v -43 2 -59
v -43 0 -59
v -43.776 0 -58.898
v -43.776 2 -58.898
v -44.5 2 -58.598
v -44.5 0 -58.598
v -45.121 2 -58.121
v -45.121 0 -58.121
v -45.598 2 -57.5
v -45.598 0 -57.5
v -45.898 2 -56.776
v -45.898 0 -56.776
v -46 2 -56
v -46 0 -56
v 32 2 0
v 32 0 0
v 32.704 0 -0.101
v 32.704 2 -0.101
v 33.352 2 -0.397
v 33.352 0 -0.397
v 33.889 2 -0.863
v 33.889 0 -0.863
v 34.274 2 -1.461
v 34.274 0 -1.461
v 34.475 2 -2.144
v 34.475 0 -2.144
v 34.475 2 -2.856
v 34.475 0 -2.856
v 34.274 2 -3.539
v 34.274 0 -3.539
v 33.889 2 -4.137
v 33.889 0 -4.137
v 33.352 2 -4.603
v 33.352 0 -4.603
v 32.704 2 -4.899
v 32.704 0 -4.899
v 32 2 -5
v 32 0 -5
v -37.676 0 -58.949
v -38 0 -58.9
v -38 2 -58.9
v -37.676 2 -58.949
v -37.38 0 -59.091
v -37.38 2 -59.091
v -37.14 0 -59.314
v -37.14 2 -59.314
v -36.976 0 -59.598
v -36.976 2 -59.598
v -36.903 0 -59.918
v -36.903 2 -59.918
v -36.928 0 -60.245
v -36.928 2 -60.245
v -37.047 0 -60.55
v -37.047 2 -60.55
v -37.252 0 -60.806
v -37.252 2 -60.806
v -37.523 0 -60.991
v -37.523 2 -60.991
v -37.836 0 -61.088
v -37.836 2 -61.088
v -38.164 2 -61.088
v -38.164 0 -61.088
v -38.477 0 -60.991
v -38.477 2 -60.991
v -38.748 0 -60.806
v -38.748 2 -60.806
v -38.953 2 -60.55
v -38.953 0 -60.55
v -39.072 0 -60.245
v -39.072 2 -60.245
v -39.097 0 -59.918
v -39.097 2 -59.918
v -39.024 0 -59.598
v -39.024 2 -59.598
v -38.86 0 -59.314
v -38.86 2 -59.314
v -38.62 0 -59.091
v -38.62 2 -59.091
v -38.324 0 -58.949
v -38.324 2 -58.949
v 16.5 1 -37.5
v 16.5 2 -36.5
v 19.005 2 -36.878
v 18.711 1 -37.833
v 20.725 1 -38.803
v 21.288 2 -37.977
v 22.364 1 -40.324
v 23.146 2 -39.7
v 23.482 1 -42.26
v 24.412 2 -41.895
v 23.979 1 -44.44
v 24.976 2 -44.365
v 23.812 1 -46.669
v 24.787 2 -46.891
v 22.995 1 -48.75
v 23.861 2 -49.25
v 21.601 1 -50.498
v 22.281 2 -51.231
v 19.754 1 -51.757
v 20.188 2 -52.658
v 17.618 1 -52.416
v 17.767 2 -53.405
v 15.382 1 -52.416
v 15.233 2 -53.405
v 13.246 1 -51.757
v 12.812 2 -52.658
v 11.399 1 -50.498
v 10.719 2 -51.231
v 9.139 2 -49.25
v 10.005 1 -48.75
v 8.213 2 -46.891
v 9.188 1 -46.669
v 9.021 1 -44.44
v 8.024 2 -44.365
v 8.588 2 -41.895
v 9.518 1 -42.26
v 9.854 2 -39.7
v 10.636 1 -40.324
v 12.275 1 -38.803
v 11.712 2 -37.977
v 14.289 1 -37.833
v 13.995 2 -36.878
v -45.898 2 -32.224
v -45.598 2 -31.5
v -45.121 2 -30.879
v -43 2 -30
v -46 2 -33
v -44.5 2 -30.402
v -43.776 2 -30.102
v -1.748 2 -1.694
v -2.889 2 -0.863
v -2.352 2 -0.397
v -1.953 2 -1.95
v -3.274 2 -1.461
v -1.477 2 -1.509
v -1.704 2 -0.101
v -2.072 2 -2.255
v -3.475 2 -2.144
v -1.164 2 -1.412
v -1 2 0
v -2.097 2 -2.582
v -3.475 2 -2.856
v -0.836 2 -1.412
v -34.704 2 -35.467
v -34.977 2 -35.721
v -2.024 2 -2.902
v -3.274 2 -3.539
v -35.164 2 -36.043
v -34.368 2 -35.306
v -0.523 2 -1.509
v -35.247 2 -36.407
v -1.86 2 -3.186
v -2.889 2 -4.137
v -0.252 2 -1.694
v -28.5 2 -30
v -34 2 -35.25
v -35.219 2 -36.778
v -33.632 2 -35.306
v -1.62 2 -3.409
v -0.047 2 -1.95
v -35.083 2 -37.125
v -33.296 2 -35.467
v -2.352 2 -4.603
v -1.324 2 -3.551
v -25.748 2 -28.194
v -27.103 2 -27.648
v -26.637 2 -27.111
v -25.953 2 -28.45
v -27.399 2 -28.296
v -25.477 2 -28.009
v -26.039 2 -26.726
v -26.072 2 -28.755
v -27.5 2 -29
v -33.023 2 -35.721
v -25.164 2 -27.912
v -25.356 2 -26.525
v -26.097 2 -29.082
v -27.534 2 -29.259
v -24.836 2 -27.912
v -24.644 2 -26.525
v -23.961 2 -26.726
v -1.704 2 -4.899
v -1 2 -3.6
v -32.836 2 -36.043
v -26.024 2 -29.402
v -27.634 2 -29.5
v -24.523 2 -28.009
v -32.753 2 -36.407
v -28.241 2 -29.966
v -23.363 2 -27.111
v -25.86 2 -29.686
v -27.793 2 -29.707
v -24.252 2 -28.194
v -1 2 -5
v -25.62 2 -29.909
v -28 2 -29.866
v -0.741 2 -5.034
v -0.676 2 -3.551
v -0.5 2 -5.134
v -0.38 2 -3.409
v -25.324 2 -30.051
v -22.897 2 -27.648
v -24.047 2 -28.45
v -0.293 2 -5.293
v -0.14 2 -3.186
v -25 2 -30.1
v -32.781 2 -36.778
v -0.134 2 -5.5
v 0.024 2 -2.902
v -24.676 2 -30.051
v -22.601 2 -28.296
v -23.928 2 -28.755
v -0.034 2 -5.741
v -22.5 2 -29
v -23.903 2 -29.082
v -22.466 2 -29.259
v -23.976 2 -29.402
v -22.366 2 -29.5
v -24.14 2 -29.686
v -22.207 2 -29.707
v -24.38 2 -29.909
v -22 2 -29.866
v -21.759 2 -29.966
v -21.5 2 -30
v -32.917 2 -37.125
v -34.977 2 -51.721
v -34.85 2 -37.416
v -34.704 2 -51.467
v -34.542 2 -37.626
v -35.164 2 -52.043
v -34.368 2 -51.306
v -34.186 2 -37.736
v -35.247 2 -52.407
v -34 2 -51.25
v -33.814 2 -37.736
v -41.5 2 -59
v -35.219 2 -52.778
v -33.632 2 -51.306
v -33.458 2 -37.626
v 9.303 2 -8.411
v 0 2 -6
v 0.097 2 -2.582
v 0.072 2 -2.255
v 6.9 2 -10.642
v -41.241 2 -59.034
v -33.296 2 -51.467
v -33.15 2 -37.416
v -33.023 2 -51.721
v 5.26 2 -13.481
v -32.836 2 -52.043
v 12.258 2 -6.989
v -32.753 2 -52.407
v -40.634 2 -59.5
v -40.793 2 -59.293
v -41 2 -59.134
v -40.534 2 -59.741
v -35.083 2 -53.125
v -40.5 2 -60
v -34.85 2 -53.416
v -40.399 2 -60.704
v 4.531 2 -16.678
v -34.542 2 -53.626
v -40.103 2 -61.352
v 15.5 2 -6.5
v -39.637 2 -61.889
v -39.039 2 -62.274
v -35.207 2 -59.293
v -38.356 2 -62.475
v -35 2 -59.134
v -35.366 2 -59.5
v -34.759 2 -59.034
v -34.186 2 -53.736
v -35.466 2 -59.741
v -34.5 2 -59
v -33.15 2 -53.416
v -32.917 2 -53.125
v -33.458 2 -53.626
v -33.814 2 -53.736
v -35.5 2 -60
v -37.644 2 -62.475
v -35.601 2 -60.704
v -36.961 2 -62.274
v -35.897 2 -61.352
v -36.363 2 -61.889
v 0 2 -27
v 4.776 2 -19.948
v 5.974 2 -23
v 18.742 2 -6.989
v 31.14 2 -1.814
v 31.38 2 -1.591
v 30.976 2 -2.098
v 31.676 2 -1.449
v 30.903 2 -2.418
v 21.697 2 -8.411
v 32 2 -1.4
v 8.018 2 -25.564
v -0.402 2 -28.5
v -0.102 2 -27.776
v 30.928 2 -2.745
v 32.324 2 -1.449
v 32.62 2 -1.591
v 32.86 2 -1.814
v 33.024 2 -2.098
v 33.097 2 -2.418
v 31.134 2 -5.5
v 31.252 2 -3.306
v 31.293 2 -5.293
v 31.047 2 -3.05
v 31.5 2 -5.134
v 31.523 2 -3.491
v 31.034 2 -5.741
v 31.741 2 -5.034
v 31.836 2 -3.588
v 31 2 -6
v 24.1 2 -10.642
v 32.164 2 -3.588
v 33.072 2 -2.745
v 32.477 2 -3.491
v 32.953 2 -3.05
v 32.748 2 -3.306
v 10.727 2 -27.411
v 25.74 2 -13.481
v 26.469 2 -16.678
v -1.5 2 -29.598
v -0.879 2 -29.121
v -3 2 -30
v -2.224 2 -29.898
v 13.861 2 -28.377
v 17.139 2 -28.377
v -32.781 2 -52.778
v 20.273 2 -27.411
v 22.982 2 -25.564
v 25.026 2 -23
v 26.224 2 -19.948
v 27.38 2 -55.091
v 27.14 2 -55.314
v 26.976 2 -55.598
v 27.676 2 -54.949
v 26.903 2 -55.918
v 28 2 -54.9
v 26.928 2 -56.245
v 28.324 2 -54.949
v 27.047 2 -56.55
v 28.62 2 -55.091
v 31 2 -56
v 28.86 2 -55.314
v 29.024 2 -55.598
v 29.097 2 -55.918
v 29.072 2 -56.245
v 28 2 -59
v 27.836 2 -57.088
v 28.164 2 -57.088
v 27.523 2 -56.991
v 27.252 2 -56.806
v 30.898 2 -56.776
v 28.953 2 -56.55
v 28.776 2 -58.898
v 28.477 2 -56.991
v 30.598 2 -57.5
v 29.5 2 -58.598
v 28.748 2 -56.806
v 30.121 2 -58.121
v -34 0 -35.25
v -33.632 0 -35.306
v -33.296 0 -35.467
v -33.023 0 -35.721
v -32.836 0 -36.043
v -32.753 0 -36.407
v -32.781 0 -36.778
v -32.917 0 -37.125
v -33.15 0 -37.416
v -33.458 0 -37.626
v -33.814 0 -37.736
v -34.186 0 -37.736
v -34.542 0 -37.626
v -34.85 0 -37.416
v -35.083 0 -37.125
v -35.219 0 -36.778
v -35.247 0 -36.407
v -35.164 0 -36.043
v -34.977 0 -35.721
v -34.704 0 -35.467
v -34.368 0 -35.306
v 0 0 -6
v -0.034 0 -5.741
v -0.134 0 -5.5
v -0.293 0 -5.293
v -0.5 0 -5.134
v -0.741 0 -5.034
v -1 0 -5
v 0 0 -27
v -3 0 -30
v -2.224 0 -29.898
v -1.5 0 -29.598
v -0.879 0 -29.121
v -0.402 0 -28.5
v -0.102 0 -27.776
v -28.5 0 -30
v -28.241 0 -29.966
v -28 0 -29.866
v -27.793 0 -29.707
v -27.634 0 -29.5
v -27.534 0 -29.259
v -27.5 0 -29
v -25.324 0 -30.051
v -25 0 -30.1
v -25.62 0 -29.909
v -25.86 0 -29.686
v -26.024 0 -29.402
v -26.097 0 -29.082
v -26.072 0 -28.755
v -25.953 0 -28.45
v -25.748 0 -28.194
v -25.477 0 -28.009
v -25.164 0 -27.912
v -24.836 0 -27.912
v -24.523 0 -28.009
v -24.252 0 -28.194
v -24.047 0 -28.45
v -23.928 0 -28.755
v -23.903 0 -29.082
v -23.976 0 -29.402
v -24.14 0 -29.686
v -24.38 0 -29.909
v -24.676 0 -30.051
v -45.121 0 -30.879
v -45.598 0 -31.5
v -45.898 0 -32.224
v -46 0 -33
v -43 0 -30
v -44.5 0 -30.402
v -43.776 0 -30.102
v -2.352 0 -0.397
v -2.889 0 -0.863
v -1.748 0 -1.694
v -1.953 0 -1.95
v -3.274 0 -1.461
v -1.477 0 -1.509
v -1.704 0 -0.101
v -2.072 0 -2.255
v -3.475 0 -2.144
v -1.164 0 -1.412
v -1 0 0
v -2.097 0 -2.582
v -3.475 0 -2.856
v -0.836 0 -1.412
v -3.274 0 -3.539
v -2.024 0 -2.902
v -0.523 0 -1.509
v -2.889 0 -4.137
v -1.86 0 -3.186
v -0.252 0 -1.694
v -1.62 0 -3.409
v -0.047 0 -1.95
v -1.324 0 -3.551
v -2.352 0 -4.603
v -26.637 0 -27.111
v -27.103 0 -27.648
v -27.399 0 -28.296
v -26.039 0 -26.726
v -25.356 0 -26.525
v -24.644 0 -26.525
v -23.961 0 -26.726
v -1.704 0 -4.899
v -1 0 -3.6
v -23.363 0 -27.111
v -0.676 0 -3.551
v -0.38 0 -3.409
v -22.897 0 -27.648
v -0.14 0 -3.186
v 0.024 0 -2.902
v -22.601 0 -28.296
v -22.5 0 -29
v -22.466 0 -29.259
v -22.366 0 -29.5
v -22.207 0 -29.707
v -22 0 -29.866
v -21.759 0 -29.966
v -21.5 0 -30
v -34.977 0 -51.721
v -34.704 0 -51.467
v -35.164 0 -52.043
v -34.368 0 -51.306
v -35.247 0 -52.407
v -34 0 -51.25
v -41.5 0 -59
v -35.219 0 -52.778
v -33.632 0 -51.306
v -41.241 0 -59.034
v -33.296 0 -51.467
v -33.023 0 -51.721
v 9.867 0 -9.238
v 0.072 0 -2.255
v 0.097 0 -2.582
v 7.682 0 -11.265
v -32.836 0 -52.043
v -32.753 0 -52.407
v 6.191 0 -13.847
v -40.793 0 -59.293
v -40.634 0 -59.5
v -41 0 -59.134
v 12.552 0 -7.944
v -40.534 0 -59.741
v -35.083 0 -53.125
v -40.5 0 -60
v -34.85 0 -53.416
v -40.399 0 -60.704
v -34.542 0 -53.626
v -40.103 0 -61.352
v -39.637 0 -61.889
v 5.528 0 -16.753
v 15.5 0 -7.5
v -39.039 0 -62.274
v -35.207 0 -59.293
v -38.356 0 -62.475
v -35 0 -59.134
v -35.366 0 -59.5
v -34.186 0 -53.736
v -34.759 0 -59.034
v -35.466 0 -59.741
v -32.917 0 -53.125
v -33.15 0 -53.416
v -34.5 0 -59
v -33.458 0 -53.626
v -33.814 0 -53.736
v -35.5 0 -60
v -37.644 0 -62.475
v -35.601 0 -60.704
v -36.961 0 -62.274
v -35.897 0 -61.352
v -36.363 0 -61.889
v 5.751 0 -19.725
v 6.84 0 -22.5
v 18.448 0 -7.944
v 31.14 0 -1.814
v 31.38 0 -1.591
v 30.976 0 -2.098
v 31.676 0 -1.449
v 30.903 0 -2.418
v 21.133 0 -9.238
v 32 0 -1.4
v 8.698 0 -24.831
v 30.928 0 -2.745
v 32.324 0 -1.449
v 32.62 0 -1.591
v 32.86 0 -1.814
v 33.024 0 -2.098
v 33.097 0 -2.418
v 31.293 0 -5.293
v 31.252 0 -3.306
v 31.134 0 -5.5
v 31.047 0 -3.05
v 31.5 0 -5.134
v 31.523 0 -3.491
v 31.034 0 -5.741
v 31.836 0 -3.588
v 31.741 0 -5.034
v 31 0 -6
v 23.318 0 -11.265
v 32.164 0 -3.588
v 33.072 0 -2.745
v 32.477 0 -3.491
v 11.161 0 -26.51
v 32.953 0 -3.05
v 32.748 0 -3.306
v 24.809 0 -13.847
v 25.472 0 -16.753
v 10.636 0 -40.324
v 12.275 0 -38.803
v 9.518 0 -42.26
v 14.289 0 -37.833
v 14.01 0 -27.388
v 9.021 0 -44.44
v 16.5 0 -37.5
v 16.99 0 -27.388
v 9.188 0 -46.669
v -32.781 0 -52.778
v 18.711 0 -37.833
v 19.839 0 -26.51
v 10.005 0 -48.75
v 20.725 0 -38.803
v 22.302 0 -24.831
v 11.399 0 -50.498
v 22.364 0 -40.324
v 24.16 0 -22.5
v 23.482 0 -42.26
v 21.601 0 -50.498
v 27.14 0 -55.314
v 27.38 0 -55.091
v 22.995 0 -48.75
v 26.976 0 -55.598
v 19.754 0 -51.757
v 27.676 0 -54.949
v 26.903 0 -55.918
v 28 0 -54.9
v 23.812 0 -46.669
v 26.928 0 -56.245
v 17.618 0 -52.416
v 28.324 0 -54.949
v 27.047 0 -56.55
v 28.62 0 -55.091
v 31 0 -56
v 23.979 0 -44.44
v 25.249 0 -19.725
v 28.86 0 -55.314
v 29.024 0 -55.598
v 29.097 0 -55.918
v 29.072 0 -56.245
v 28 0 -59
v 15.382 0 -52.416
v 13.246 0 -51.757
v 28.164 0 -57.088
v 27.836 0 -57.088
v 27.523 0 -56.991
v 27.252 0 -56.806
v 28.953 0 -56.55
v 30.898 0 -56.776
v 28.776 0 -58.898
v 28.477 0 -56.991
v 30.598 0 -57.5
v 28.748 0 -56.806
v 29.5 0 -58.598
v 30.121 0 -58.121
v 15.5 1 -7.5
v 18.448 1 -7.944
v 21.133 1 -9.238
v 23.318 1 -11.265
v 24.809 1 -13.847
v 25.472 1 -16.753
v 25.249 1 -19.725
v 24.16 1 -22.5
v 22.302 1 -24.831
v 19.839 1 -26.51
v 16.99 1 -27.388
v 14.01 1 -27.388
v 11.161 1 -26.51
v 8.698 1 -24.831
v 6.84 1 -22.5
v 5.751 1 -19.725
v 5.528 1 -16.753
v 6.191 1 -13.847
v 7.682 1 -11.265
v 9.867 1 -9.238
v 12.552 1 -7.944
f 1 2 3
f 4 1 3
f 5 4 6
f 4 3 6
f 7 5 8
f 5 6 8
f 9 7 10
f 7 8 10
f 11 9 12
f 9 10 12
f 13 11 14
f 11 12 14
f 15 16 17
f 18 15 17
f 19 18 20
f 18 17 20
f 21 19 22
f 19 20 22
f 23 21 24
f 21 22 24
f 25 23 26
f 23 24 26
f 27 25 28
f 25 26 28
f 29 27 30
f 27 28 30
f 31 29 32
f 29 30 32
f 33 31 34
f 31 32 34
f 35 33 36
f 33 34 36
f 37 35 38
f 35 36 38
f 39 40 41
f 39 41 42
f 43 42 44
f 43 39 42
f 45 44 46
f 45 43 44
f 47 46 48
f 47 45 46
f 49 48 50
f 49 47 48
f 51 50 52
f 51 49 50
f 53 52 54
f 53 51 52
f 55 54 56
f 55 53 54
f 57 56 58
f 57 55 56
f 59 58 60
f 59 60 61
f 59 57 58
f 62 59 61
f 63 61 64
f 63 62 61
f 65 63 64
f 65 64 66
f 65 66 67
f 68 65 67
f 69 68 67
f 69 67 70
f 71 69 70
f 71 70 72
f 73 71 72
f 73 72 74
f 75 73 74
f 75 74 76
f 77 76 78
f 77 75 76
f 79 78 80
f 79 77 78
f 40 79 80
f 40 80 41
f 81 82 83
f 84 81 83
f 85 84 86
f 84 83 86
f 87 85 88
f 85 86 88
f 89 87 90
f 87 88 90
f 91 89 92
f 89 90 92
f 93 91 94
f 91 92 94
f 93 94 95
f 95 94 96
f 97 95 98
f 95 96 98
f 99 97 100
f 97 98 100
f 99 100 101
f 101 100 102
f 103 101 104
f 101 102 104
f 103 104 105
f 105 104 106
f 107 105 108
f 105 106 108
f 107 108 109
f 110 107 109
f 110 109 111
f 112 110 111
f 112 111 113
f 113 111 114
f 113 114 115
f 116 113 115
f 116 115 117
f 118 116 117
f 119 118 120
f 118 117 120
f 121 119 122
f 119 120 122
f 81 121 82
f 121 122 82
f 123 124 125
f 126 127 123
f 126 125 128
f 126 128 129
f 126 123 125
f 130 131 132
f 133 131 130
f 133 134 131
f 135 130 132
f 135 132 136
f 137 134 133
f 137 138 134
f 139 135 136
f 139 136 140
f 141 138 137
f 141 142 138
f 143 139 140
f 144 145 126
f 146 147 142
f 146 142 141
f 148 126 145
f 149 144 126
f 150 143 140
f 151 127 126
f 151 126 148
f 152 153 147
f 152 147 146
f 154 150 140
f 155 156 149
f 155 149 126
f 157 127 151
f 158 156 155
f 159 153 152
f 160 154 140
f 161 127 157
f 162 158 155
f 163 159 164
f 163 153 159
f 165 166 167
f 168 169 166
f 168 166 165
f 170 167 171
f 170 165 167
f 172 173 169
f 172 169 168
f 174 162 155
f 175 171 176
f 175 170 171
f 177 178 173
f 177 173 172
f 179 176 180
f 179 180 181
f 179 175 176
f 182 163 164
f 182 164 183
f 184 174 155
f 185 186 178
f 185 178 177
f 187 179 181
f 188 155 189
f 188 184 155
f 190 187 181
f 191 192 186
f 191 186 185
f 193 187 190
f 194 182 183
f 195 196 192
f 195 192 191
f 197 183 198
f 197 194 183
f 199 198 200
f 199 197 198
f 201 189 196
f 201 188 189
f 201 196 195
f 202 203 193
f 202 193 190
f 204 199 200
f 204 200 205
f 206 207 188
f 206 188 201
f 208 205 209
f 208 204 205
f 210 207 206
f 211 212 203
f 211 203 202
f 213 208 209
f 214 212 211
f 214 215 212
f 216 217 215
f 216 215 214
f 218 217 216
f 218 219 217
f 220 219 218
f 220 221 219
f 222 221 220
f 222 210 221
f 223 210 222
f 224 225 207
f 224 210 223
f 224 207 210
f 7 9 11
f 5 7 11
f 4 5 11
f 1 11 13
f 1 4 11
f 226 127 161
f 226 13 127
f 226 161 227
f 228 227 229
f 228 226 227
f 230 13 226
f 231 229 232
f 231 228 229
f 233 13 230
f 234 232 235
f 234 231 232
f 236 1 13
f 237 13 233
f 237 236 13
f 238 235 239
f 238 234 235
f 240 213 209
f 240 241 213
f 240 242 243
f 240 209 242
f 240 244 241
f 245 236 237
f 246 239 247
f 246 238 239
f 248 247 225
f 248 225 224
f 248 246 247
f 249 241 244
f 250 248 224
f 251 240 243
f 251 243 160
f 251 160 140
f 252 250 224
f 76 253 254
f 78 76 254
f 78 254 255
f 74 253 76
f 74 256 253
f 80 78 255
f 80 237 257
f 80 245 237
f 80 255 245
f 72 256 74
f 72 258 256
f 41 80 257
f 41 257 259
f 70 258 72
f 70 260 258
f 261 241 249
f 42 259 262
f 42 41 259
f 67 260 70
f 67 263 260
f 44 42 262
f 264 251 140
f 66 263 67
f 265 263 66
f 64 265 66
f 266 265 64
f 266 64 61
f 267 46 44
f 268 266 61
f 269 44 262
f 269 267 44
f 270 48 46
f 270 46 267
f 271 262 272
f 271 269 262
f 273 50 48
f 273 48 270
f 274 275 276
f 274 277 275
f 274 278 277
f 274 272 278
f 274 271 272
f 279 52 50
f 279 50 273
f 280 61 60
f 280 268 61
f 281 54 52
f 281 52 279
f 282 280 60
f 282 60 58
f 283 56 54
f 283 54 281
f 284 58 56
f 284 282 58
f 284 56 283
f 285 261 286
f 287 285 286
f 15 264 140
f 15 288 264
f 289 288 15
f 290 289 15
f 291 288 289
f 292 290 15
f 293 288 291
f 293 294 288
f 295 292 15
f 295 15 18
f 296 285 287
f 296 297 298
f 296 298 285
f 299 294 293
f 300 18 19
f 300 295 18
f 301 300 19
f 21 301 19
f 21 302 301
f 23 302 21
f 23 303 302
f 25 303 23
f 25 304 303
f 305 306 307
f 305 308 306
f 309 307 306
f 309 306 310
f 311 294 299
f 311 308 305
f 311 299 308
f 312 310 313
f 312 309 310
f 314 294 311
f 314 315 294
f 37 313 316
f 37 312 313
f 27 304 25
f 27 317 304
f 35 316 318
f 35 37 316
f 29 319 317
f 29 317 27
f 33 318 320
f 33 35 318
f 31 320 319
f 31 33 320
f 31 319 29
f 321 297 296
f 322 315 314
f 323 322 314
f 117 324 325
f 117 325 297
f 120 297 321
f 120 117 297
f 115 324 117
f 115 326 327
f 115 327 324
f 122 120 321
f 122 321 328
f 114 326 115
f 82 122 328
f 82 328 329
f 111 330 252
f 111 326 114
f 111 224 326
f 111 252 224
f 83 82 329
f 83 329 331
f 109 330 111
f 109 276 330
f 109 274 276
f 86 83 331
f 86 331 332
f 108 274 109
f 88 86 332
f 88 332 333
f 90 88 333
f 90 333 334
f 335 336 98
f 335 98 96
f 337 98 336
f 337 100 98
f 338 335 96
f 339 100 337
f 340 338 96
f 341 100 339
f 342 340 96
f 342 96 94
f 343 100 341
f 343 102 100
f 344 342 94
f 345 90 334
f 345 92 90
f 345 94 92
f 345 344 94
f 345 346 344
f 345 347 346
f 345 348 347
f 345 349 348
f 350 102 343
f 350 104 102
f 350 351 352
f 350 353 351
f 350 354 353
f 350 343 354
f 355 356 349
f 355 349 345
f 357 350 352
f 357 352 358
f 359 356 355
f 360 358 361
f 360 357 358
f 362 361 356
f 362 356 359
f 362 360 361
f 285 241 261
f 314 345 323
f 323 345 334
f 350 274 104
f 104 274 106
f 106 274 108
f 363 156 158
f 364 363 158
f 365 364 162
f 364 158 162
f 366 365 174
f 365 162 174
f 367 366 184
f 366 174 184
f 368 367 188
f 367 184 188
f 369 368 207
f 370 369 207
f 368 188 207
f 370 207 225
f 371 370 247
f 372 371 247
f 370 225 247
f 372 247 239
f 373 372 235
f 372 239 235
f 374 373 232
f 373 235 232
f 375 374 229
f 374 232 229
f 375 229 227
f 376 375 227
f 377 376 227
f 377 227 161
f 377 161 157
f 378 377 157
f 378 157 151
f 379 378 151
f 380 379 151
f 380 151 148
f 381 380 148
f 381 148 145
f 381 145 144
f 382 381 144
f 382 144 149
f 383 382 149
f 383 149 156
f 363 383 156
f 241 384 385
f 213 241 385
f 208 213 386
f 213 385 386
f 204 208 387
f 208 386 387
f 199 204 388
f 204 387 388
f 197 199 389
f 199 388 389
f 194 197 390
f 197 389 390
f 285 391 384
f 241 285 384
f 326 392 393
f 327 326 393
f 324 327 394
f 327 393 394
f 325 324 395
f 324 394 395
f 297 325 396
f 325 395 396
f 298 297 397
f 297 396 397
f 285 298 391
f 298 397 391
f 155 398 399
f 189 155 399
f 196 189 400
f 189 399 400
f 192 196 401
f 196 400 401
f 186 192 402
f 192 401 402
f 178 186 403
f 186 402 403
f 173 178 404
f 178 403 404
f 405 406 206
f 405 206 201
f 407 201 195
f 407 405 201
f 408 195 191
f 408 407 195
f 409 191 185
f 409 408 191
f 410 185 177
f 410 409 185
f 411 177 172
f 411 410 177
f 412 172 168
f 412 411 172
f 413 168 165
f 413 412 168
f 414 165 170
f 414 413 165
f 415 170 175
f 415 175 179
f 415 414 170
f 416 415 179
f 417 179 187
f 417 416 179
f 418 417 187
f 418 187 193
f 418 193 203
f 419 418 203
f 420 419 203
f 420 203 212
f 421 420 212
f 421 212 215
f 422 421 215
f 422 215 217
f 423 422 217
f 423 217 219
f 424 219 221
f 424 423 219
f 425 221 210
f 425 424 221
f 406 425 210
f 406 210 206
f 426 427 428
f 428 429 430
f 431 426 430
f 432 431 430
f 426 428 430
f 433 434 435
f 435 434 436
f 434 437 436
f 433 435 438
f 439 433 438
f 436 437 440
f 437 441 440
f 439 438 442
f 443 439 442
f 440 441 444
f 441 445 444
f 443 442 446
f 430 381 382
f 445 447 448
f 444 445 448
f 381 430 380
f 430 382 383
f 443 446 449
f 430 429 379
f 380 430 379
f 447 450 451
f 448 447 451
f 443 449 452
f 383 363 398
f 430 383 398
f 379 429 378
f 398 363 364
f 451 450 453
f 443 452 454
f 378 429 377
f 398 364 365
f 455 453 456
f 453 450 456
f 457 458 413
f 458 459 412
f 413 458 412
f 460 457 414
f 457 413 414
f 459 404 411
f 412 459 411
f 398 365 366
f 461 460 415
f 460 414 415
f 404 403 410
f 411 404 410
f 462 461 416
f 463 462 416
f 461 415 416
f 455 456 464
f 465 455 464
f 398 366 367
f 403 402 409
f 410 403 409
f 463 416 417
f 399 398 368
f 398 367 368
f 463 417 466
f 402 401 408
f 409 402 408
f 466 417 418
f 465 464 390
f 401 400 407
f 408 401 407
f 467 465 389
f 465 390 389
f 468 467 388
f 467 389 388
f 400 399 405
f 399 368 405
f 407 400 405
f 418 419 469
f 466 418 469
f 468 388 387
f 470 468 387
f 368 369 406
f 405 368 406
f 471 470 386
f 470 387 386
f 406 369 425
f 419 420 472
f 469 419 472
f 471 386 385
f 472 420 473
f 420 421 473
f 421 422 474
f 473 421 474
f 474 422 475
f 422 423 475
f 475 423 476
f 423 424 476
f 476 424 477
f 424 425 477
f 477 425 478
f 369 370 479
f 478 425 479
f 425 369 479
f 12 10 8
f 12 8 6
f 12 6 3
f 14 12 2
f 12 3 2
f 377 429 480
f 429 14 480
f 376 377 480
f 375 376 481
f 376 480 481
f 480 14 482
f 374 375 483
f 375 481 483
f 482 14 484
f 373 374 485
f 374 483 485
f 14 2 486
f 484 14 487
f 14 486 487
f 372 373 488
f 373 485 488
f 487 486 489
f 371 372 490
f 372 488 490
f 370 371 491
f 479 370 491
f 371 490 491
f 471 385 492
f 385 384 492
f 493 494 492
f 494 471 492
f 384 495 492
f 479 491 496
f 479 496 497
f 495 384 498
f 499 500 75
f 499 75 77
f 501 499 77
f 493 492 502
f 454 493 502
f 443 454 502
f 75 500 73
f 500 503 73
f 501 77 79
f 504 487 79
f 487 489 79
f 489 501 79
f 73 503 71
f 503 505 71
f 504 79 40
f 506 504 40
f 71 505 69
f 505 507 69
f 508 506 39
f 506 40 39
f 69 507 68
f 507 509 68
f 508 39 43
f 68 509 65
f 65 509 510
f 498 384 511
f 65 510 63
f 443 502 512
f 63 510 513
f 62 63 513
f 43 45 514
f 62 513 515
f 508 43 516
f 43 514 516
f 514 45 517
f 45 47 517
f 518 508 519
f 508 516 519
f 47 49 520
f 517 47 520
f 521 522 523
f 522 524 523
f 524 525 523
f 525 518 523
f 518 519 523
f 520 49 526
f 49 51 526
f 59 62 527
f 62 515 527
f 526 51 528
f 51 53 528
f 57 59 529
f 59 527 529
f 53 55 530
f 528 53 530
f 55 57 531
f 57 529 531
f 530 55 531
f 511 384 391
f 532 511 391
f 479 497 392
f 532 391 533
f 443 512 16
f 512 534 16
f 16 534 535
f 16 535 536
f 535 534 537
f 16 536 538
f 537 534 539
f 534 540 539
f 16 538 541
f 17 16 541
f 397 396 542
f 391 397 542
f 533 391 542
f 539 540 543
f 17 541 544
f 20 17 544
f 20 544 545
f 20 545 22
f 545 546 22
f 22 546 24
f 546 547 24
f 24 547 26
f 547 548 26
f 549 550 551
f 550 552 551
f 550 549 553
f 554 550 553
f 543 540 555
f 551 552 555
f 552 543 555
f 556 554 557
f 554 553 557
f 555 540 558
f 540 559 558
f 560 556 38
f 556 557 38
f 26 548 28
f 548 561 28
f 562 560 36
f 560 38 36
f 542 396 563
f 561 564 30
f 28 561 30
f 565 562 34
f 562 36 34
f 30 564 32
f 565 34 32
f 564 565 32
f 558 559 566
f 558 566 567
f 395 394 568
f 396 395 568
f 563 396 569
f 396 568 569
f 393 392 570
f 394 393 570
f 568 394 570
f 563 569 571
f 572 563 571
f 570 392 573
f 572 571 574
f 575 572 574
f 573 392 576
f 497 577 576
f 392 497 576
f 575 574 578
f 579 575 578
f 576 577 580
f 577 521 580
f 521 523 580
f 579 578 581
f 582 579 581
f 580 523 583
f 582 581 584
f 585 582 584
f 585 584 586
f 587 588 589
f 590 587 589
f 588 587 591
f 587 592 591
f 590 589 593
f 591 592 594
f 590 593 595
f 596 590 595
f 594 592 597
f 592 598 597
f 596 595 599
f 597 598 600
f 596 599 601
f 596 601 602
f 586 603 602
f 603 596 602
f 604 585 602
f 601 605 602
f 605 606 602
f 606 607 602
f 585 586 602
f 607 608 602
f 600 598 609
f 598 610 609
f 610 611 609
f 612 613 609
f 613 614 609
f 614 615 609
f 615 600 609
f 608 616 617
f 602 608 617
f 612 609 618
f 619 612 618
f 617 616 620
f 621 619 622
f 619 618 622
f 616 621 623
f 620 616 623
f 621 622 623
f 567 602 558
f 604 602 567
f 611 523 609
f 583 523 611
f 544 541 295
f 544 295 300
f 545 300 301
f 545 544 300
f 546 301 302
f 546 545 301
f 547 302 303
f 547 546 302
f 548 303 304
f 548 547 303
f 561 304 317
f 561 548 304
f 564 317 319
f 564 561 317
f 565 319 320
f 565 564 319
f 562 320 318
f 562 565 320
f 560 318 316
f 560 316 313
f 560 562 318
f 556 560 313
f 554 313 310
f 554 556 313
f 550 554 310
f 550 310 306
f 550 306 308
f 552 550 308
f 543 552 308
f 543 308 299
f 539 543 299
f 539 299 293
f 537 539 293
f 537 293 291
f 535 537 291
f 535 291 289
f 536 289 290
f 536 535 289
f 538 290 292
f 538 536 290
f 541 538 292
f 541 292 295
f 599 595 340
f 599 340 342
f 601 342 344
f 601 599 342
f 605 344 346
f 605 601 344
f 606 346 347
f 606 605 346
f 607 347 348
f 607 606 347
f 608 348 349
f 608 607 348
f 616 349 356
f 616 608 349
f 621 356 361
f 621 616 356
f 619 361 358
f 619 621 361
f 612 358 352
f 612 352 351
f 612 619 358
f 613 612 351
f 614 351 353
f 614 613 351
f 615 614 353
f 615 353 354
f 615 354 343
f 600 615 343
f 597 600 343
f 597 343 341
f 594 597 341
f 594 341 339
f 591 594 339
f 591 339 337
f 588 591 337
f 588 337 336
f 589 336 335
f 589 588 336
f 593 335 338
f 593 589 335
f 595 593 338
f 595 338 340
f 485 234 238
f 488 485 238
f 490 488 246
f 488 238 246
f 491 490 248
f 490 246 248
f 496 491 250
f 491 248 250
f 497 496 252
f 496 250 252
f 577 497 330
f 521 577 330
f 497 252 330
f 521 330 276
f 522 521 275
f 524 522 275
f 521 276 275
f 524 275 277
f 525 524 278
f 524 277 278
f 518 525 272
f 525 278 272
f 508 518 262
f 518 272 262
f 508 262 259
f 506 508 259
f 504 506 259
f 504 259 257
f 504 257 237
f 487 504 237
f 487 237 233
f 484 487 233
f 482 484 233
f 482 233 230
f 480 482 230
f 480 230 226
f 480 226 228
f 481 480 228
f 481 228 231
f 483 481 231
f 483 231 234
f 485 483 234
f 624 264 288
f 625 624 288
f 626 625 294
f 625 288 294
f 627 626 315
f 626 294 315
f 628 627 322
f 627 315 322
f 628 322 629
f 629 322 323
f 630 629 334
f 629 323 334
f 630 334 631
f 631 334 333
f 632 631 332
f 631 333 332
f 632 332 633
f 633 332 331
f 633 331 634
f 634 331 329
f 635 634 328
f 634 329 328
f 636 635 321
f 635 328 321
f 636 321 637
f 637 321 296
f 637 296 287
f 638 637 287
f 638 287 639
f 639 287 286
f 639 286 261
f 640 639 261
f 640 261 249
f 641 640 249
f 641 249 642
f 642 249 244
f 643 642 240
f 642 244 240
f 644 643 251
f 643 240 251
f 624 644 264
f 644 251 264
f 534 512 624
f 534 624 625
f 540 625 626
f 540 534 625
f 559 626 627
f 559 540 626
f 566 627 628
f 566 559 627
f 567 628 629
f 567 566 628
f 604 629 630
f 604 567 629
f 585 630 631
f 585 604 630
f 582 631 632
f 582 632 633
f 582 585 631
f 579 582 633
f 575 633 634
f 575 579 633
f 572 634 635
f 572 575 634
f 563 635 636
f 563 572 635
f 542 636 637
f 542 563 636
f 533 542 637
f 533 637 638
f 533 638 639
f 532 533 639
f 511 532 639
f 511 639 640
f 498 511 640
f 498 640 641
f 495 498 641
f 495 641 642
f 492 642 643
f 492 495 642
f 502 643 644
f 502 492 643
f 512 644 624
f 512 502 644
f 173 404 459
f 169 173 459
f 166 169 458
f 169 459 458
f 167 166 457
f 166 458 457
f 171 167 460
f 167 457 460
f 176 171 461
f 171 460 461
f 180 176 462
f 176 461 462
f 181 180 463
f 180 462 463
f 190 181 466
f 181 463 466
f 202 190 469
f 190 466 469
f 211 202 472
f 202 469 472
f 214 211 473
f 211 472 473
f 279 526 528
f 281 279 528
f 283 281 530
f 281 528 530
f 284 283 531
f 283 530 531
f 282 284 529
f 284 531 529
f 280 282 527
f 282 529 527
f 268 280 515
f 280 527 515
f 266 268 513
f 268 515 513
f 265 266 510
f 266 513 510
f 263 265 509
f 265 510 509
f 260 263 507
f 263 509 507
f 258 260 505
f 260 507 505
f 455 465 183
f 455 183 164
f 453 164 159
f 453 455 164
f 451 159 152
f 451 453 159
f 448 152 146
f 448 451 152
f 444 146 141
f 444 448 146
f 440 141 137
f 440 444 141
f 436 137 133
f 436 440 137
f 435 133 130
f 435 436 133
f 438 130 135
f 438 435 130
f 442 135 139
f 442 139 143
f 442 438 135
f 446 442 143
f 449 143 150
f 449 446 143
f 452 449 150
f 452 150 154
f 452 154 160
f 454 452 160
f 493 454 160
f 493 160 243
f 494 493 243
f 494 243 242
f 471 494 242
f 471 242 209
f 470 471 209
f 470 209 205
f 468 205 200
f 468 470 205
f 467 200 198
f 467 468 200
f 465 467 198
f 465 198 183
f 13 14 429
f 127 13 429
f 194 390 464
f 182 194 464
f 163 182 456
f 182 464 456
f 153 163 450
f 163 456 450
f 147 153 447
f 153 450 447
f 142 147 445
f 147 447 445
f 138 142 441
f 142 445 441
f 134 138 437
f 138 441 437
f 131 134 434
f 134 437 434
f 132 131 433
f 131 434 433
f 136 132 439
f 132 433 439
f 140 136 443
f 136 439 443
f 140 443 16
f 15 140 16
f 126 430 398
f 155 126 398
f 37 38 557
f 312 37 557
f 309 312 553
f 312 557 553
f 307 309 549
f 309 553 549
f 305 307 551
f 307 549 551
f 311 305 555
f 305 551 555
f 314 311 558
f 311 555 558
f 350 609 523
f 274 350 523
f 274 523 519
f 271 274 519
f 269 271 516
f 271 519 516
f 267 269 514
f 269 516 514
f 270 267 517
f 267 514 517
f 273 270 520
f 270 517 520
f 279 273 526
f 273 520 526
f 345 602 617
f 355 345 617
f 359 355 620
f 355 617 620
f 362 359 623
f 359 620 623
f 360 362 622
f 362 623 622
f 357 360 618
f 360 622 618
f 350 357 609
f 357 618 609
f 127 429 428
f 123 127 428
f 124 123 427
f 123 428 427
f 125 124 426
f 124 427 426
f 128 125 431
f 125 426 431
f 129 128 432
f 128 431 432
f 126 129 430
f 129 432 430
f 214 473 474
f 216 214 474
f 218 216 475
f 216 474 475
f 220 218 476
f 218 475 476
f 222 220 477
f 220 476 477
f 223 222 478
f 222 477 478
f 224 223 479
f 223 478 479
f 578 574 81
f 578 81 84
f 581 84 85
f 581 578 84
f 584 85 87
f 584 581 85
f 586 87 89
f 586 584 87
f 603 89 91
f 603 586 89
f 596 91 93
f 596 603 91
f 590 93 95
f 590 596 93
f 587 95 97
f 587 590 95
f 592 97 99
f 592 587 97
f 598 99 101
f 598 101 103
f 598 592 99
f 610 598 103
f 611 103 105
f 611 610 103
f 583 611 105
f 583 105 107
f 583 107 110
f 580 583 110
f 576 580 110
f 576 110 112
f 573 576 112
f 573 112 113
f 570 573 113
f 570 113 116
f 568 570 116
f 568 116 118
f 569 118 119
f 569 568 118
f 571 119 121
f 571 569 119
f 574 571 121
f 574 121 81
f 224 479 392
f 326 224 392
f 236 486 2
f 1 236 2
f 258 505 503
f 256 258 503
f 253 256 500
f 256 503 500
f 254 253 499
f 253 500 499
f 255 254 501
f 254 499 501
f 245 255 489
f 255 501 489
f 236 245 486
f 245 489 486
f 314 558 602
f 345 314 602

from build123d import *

# Parameters (mm, degrees)
CROQUIS1_R              = 10
CROQUIS1_R_2            = 7.5
CROQUIS1_R_3            = 1.1
SALIENTE_EXTRUIR1_DEPTH = 2
CHAFL_N1_SIZE           = 1
CROQUIS2_R              = 1.25
CORTAR_EXTRUIR1_DEPTH   = 78.628925022


with BuildPart() as part:
    # Croquis1 → Saliente-Extruir1 (new body)
    with BuildSketch(Plane(origin=(0, 0, 0), x_dir=(1, 0, 0), z_dir=(0, 1, 0))):
        with BuildLine():
            Line((-43, 30), (-28.5, 30))
            ThreePointArc((-28.5, 30), (-27.792893219, 29.707106781), (-27.5, 29))
            ThreePointArc((-27.5, 29), (-25, 26.5), (-22.5, 29))
            ThreePointArc((-22.5, 29), (-22.207106781, 29.707106781), (-21.5, 30))
            Line((-21.5, 30), (-3, 30))
            ThreePointArc((-3, 30), (-0.878679656, 29.121320344), (0, 27))
            Line((0, 27), (0, 6))
            ThreePointArc((0, 6), (-0.292893219, 5.292893219), (-1, 5))
            ThreePointArc((-1, 5), (-3.5, 2.5), (-1, 0))
            Line((-1, 0), (0, 0))
            Line((0, 0), (31, 0))
            Line((31, 0), (32, 0))
            ThreePointArc((32, 0), (34.5, 2.5), (32, 5))
            ThreePointArc((32, 5), (31.292893219, 5.292893219), (31, 6))
            Line((31, 6), (31, 56))
            ThreePointArc((31, 56), (30.121320344, 58.121320344), (28, 59))
            Line((28, 59), (-34.5, 59))
            ThreePointArc((-34.5, 59), (-35.207106781, 59.292893219), (-35.5, 60))
            ThreePointArc((-35.5, 60), (-38, 62.5), (-40.5, 60))
            ThreePointArc((-40.5, 60), (-40.792893219, 59.292893219), (-41.5, 59))
            Line((-41.5, 59), (-43, 59))
            ThreePointArc((-43, 59), (-45.121320344, 58.121320344), (-46, 56))
            Line((-46, 56), (-46, 33))
            ThreePointArc((-46, 33), (-45.121320344, 30.878679656), (-43, 30))
        make_face()
        with Locations(Location((15.5, 17.5, 0), (0, 0, 270))):
            Circle(CROQUIS1_R, mode=Mode.SUBTRACT)
        with Locations(Location((16.5, 45, 0), (0, 0, 270))):
            Circle(CROQUIS1_R_2, mode=Mode.SUBTRACT)
        with Locations(Location((32, 2.5, 0), (0, 0, 270))):
            Circle(CROQUIS1_R_3, mode=Mode.SUBTRACT)
        with Locations(Location((-38, 60, 0), (0, 0, 270))):
            Circle(CROQUIS1_R_3, mode=Mode.SUBTRACT)
        with Locations(Location((-1, 2.5, 0), (0, 0, 90))):
            Circle(CROQUIS1_R_3, mode=Mode.SUBTRACT)
        with Locations(Location((-25, 29, 0), (0, 0, 90))):
            Circle(CROQUIS1_R_3, mode=Mode.SUBTRACT)
        with Locations(Location((28, 56, 0), (0, 0, 270))):
            Circle(CROQUIS1_R_3, mode=Mode.SUBTRACT)
    extrude(amount=SALIENTE_EXTRUIR1_DEPTH)

    # Chaflán1
    chafl_n1_edges = [part.edges().sort_by_distance(p)[0] for p in [
        (15.5, 2, -27.5),
        (16.5, 2, -52.5),
    ]]
    chamfer(chafl_n1_edges, length=CHAFL_N1_SIZE)

    # Croquis2 → Cortar-Extruir1 (cut, through all)
    with BuildSketch(Plane(origin=(0, 2, 0), x_dir=(1, 0, 0), z_dir=(0, 1, 0))):
        with Locations(Location((-34, 52.5, 0), (0, 0, 270))):
            Circle(CROQUIS2_R)
        with Locations(Location((-34, 36.5, 0), (0, 0, 270))):
            Circle(CROQUIS2_R)
    extrude(amount=-CORTAR_EXTRUIR1_DEPTH, mode=Mode.SUBTRACT)


solid = part.part
